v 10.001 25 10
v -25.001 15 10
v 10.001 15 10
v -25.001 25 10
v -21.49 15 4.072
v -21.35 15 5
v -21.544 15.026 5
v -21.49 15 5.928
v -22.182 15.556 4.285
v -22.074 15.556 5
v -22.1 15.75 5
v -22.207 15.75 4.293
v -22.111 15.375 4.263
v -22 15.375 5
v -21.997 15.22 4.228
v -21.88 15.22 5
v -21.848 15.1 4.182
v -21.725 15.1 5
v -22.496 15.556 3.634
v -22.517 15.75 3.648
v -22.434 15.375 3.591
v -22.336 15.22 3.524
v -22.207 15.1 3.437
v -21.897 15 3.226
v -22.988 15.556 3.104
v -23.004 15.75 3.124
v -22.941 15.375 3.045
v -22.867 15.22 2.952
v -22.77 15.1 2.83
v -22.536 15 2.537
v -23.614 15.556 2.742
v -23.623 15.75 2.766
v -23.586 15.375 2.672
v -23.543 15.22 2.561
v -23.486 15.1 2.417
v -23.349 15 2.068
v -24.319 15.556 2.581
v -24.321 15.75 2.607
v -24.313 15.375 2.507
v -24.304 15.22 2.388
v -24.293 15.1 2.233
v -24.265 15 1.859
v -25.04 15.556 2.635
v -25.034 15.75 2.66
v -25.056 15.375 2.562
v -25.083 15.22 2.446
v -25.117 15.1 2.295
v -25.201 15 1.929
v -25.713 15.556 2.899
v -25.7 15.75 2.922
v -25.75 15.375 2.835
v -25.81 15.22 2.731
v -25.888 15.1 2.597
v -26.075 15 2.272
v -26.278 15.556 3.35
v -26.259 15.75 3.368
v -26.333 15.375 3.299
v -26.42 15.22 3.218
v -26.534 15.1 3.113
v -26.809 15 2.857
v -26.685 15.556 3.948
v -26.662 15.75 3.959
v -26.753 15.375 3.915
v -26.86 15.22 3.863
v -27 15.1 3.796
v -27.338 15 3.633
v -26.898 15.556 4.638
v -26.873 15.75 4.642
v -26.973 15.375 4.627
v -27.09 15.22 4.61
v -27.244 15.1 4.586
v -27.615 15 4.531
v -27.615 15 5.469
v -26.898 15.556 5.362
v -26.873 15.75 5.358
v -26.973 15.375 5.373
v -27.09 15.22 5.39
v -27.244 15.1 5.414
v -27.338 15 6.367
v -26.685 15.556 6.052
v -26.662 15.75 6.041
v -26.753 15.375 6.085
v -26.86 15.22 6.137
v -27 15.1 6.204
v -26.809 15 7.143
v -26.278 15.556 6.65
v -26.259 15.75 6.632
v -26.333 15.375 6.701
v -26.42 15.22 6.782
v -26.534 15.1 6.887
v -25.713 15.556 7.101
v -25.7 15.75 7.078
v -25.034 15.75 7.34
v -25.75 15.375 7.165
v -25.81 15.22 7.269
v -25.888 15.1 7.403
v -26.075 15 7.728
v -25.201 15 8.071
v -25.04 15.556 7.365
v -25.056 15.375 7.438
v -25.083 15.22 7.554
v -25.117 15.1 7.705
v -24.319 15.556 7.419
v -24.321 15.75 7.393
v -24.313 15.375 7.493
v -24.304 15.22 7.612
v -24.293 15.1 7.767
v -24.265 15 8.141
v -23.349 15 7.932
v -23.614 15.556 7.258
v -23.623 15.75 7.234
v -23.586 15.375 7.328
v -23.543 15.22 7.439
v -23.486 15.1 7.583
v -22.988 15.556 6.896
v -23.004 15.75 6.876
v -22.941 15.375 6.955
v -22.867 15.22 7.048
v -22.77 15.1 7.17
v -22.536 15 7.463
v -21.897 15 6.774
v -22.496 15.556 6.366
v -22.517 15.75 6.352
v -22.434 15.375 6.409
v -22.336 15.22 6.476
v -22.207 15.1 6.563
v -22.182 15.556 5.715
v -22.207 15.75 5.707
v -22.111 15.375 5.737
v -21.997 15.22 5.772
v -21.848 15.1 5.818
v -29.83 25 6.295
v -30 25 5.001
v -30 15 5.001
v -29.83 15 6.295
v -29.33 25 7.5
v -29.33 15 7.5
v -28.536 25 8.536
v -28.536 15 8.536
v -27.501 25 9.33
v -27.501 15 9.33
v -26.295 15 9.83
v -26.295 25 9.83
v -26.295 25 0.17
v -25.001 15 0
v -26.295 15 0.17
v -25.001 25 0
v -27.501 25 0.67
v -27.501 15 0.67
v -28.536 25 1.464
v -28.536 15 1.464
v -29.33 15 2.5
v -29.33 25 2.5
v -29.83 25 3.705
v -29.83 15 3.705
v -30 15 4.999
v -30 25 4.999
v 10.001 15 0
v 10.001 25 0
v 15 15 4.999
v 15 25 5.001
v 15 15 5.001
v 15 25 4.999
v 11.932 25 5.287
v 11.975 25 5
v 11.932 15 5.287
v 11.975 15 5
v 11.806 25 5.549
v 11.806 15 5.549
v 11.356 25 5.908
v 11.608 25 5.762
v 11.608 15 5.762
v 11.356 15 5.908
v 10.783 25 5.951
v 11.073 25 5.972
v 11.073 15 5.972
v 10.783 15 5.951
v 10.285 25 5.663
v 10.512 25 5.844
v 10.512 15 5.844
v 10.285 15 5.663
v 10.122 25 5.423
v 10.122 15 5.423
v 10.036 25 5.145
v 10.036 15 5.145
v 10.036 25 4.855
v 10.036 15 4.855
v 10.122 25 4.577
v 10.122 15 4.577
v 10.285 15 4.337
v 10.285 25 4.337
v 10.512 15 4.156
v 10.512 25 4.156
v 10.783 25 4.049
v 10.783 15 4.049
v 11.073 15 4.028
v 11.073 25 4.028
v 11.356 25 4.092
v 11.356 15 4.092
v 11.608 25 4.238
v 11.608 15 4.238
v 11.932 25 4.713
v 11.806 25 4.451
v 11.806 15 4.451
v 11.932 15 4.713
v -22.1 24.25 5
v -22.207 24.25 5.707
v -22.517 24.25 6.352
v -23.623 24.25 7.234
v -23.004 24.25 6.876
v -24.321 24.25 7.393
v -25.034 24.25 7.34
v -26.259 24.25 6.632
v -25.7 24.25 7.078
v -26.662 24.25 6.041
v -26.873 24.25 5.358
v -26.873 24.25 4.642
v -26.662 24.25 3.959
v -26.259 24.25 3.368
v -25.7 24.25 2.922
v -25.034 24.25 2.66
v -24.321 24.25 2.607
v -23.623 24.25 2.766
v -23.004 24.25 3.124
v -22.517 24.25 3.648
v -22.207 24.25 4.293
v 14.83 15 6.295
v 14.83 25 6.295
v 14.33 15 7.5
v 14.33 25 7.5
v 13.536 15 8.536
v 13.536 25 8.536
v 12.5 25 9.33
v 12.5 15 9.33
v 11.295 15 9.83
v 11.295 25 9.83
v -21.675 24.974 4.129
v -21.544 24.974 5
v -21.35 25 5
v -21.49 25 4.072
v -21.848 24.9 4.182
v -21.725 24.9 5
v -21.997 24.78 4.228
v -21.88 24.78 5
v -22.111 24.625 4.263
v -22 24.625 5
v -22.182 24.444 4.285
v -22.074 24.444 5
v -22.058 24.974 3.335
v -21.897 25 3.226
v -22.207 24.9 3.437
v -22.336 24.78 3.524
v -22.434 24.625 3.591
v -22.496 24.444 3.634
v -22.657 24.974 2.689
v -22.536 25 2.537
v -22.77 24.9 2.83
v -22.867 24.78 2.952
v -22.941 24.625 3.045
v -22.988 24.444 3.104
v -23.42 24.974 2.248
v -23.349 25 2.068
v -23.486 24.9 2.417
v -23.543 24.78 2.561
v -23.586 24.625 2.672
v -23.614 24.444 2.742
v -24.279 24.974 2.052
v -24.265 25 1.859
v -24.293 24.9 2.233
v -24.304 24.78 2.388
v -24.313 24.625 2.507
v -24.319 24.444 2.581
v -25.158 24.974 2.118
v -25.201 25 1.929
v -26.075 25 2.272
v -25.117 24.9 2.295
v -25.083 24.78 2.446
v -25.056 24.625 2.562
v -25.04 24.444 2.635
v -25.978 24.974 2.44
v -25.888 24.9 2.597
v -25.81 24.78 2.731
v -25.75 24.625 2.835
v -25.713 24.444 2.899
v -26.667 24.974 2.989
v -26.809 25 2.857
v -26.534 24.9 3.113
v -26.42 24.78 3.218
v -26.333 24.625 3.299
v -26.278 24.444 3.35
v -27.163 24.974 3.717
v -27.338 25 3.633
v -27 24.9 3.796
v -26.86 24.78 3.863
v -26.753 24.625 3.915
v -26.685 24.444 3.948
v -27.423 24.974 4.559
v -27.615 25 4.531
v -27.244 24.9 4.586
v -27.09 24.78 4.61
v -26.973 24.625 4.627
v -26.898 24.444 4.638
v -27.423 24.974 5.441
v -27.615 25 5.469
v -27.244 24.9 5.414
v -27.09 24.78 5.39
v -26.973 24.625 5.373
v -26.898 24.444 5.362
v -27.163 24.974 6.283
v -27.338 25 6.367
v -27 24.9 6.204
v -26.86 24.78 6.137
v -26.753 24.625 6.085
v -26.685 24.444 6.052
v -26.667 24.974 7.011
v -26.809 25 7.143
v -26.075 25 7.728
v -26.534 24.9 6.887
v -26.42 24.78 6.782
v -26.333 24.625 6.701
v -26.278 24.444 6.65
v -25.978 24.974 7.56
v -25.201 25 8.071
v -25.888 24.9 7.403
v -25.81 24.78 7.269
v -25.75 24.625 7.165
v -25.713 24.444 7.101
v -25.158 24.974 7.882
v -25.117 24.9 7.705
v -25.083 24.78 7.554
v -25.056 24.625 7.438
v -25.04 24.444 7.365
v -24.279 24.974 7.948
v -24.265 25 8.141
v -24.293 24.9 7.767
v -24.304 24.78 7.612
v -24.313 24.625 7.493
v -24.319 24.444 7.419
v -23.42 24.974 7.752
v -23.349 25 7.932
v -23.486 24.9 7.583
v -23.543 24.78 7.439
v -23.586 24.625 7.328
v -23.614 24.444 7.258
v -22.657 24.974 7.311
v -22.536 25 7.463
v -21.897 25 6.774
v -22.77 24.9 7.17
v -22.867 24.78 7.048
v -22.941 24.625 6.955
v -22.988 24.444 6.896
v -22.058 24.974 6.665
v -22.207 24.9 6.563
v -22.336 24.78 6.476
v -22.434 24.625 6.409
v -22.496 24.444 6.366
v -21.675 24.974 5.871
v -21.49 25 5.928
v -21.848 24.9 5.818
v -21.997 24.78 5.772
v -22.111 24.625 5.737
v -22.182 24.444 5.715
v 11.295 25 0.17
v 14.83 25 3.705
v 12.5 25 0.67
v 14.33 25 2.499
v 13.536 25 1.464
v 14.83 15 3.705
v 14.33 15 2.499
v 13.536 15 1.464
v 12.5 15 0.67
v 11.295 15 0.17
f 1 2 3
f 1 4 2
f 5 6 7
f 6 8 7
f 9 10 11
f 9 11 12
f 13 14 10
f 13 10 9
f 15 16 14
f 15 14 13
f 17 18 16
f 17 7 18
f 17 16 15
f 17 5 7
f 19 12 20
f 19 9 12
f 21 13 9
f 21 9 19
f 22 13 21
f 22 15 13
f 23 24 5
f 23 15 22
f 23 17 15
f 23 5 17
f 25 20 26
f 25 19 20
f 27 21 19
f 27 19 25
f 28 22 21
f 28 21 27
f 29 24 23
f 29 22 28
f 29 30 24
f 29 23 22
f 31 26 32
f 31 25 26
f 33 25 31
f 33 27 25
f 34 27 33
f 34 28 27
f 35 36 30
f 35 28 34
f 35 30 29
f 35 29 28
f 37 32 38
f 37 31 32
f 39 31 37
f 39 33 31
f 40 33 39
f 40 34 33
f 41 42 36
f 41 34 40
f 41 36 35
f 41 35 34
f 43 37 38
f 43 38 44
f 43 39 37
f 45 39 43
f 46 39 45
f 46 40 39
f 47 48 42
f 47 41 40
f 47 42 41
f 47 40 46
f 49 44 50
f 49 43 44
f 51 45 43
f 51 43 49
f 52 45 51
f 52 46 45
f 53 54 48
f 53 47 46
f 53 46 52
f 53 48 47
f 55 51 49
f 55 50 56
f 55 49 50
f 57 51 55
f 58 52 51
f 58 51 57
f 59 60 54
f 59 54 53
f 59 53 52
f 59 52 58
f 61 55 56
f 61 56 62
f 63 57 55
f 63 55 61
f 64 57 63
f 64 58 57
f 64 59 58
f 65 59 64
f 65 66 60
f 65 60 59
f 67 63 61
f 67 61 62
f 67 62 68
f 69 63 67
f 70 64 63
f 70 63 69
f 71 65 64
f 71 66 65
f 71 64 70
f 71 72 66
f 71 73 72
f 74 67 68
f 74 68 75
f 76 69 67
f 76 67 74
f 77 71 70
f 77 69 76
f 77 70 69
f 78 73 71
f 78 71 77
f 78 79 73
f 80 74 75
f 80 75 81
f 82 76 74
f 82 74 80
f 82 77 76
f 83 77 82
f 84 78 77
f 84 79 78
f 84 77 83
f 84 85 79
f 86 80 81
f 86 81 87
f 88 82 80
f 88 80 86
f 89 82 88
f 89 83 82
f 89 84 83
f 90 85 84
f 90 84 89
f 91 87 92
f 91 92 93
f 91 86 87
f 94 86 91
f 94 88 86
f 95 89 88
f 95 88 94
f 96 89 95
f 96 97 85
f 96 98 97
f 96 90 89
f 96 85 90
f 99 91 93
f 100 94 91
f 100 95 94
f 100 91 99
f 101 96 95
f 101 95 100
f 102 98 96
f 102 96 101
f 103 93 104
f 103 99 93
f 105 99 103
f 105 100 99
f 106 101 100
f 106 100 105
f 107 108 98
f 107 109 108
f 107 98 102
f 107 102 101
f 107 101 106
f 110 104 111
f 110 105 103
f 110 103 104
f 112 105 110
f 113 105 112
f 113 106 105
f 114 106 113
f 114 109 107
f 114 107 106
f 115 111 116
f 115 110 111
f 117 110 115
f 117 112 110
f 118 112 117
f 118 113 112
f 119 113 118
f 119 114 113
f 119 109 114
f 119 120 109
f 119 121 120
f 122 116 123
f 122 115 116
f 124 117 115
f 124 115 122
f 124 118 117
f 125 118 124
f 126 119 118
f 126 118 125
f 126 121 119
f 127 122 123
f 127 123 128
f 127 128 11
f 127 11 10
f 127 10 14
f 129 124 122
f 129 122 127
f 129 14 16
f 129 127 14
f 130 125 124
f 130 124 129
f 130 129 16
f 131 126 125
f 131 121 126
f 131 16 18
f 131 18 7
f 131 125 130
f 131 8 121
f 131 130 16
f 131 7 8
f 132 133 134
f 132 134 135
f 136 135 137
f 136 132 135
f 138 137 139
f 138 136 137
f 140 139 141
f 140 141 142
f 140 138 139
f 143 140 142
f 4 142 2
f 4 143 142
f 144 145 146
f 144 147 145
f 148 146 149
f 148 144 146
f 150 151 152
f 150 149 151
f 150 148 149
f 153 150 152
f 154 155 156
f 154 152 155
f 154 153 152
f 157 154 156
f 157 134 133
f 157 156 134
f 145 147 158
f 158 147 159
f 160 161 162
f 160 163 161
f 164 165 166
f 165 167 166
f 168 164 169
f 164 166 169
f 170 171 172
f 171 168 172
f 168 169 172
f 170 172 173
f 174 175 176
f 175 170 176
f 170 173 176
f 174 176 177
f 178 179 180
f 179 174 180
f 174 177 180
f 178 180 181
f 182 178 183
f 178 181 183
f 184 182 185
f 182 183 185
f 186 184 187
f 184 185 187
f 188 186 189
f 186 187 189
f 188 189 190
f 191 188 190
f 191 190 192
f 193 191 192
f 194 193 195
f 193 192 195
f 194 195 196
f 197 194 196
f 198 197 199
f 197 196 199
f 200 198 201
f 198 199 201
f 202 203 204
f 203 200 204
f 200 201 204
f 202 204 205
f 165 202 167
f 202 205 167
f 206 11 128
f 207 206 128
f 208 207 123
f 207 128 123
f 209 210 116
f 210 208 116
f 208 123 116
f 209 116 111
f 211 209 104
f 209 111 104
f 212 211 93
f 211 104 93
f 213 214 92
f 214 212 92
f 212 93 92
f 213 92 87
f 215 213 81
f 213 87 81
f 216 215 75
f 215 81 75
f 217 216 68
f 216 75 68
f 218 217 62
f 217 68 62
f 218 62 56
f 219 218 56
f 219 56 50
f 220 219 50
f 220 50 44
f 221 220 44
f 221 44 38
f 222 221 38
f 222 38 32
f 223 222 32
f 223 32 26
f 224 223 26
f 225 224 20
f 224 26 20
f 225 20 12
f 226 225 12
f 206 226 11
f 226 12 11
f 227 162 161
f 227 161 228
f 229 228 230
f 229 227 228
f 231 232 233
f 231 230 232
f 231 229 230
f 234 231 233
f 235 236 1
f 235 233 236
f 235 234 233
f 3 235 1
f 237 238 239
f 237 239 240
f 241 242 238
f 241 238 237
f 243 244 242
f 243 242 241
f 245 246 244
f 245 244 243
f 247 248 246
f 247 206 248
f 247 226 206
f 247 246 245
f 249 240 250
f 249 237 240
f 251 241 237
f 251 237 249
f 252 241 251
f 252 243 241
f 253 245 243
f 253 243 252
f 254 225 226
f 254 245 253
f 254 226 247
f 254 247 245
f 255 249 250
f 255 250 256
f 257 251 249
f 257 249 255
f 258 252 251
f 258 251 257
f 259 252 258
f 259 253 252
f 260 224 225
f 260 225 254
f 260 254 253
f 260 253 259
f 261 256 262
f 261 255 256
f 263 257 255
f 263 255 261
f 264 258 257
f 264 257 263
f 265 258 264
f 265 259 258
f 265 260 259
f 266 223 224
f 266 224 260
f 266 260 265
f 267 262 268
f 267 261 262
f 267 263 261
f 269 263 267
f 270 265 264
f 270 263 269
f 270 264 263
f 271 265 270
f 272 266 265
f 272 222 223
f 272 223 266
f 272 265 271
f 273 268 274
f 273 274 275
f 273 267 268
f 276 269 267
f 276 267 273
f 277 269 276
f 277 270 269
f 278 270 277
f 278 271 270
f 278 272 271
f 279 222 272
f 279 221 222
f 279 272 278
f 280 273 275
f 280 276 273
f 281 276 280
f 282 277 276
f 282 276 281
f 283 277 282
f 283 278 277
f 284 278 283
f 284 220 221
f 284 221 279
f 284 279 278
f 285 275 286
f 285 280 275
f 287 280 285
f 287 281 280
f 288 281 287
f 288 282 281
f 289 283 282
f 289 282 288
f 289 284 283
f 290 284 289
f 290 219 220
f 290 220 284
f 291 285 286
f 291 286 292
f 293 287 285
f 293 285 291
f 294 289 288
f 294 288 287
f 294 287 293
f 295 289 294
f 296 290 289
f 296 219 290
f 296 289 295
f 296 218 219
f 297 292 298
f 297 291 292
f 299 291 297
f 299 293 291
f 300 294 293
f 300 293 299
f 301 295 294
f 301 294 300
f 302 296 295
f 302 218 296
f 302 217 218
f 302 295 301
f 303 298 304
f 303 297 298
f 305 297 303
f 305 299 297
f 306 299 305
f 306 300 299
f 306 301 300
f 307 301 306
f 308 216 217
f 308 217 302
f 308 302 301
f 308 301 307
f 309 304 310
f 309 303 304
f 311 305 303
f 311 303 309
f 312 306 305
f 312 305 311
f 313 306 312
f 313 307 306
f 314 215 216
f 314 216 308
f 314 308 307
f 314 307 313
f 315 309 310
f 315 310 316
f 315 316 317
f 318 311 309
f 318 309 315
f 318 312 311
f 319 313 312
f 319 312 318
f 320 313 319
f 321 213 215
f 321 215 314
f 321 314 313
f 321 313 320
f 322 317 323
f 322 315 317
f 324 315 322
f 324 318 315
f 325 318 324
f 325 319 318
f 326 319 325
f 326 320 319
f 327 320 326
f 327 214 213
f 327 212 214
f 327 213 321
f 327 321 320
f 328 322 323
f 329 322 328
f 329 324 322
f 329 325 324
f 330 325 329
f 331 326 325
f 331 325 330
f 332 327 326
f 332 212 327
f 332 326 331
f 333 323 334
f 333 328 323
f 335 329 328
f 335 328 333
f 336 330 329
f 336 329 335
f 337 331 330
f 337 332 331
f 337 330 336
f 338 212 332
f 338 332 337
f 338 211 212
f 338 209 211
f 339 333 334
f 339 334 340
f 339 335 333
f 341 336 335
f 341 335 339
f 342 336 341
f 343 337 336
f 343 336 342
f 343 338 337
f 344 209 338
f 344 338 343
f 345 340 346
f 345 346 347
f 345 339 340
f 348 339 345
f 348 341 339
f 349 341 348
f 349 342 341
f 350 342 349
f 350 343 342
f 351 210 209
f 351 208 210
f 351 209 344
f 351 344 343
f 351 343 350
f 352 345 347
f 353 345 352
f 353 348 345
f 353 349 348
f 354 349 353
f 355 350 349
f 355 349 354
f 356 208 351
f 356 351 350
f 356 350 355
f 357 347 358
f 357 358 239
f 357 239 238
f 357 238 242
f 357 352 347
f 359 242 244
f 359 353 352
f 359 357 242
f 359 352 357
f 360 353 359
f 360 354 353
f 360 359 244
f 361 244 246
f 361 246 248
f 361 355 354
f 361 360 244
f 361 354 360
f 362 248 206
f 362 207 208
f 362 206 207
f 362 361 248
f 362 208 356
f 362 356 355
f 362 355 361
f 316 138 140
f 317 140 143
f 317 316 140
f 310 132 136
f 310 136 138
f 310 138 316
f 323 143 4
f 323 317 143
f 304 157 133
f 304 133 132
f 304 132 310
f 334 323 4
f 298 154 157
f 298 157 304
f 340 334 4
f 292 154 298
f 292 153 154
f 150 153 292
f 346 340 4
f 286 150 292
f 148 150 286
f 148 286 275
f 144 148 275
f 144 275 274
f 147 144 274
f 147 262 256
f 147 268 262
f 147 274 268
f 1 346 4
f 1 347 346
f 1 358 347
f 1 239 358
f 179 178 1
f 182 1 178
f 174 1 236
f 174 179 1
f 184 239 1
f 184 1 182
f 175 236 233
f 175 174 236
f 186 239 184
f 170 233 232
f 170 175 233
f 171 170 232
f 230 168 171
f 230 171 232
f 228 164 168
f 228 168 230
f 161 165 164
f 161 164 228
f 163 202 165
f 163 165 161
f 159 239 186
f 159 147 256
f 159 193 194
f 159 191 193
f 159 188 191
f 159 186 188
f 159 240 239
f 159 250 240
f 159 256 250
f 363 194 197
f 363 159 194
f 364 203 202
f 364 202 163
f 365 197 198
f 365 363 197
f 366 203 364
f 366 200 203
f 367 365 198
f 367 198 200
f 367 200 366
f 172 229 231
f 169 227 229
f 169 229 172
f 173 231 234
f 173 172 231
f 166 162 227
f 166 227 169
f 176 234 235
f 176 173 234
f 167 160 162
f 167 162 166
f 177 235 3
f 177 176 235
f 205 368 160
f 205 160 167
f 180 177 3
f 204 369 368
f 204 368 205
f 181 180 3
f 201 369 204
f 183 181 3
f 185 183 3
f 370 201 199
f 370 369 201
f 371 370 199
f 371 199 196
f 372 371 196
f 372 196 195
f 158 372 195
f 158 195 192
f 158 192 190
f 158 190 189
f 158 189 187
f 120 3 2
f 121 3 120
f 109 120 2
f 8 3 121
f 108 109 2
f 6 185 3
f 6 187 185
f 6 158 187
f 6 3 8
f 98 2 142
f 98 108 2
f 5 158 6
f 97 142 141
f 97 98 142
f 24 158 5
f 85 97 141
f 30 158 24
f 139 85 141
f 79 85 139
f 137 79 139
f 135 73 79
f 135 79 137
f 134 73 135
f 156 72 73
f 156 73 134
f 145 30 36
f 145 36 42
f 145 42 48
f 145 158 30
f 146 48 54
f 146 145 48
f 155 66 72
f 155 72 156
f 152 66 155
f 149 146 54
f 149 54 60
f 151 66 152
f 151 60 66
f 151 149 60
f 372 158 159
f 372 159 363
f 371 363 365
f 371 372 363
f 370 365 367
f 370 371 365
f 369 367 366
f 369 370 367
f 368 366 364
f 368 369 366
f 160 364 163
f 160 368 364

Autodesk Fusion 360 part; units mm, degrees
sketch "Esquisse1" plane through (0, 0, 0) normal (0, 0, 1) x (1, 0, 0)
  line L0 (-30, 25) -> (15, 25)
  line L1 (15, 25) -> (15, 15)
  line L2 (15, 15) -> (-30, 15)
  line L3 (-30, 15) -> (-30, 25)
  dimension "d21" = 10
  dimension "d22" = 45
extrude "Extrusion1" add sketch "Esquisse1" along normal blind 10
sketch "Esquisse2" plane through (0, 0, 0) normal (0, 1, 0) x (1, 0, 0)
  circle A0 centre (-24.5, -5) radius 2.4
  circle A1 centre (11, -5) radius 0.975
  line L0 (15, 0) -> (15, -10)
  line L1 (-30, 0) -> (-30, -10)
  dimension "d3" = 4.8
  dimension "d4" = 1.95
  dimension "d25" = 4
  dimension "d26" = 5.5
extrude "Extrusion2" cut sketch "Esquisse2" along normal blind 25 and the other way blind -15
fillet "Congé4" radius 5 4 edges at (-30, 20, 10) (15, 20, 10) (15, 20, 0) (-30, 20, 0)
fillet "Congé5" radius 0.75 2 edges at (-26.7376, 15, 5.8679) (-26.7376, 25, 4.1321)
